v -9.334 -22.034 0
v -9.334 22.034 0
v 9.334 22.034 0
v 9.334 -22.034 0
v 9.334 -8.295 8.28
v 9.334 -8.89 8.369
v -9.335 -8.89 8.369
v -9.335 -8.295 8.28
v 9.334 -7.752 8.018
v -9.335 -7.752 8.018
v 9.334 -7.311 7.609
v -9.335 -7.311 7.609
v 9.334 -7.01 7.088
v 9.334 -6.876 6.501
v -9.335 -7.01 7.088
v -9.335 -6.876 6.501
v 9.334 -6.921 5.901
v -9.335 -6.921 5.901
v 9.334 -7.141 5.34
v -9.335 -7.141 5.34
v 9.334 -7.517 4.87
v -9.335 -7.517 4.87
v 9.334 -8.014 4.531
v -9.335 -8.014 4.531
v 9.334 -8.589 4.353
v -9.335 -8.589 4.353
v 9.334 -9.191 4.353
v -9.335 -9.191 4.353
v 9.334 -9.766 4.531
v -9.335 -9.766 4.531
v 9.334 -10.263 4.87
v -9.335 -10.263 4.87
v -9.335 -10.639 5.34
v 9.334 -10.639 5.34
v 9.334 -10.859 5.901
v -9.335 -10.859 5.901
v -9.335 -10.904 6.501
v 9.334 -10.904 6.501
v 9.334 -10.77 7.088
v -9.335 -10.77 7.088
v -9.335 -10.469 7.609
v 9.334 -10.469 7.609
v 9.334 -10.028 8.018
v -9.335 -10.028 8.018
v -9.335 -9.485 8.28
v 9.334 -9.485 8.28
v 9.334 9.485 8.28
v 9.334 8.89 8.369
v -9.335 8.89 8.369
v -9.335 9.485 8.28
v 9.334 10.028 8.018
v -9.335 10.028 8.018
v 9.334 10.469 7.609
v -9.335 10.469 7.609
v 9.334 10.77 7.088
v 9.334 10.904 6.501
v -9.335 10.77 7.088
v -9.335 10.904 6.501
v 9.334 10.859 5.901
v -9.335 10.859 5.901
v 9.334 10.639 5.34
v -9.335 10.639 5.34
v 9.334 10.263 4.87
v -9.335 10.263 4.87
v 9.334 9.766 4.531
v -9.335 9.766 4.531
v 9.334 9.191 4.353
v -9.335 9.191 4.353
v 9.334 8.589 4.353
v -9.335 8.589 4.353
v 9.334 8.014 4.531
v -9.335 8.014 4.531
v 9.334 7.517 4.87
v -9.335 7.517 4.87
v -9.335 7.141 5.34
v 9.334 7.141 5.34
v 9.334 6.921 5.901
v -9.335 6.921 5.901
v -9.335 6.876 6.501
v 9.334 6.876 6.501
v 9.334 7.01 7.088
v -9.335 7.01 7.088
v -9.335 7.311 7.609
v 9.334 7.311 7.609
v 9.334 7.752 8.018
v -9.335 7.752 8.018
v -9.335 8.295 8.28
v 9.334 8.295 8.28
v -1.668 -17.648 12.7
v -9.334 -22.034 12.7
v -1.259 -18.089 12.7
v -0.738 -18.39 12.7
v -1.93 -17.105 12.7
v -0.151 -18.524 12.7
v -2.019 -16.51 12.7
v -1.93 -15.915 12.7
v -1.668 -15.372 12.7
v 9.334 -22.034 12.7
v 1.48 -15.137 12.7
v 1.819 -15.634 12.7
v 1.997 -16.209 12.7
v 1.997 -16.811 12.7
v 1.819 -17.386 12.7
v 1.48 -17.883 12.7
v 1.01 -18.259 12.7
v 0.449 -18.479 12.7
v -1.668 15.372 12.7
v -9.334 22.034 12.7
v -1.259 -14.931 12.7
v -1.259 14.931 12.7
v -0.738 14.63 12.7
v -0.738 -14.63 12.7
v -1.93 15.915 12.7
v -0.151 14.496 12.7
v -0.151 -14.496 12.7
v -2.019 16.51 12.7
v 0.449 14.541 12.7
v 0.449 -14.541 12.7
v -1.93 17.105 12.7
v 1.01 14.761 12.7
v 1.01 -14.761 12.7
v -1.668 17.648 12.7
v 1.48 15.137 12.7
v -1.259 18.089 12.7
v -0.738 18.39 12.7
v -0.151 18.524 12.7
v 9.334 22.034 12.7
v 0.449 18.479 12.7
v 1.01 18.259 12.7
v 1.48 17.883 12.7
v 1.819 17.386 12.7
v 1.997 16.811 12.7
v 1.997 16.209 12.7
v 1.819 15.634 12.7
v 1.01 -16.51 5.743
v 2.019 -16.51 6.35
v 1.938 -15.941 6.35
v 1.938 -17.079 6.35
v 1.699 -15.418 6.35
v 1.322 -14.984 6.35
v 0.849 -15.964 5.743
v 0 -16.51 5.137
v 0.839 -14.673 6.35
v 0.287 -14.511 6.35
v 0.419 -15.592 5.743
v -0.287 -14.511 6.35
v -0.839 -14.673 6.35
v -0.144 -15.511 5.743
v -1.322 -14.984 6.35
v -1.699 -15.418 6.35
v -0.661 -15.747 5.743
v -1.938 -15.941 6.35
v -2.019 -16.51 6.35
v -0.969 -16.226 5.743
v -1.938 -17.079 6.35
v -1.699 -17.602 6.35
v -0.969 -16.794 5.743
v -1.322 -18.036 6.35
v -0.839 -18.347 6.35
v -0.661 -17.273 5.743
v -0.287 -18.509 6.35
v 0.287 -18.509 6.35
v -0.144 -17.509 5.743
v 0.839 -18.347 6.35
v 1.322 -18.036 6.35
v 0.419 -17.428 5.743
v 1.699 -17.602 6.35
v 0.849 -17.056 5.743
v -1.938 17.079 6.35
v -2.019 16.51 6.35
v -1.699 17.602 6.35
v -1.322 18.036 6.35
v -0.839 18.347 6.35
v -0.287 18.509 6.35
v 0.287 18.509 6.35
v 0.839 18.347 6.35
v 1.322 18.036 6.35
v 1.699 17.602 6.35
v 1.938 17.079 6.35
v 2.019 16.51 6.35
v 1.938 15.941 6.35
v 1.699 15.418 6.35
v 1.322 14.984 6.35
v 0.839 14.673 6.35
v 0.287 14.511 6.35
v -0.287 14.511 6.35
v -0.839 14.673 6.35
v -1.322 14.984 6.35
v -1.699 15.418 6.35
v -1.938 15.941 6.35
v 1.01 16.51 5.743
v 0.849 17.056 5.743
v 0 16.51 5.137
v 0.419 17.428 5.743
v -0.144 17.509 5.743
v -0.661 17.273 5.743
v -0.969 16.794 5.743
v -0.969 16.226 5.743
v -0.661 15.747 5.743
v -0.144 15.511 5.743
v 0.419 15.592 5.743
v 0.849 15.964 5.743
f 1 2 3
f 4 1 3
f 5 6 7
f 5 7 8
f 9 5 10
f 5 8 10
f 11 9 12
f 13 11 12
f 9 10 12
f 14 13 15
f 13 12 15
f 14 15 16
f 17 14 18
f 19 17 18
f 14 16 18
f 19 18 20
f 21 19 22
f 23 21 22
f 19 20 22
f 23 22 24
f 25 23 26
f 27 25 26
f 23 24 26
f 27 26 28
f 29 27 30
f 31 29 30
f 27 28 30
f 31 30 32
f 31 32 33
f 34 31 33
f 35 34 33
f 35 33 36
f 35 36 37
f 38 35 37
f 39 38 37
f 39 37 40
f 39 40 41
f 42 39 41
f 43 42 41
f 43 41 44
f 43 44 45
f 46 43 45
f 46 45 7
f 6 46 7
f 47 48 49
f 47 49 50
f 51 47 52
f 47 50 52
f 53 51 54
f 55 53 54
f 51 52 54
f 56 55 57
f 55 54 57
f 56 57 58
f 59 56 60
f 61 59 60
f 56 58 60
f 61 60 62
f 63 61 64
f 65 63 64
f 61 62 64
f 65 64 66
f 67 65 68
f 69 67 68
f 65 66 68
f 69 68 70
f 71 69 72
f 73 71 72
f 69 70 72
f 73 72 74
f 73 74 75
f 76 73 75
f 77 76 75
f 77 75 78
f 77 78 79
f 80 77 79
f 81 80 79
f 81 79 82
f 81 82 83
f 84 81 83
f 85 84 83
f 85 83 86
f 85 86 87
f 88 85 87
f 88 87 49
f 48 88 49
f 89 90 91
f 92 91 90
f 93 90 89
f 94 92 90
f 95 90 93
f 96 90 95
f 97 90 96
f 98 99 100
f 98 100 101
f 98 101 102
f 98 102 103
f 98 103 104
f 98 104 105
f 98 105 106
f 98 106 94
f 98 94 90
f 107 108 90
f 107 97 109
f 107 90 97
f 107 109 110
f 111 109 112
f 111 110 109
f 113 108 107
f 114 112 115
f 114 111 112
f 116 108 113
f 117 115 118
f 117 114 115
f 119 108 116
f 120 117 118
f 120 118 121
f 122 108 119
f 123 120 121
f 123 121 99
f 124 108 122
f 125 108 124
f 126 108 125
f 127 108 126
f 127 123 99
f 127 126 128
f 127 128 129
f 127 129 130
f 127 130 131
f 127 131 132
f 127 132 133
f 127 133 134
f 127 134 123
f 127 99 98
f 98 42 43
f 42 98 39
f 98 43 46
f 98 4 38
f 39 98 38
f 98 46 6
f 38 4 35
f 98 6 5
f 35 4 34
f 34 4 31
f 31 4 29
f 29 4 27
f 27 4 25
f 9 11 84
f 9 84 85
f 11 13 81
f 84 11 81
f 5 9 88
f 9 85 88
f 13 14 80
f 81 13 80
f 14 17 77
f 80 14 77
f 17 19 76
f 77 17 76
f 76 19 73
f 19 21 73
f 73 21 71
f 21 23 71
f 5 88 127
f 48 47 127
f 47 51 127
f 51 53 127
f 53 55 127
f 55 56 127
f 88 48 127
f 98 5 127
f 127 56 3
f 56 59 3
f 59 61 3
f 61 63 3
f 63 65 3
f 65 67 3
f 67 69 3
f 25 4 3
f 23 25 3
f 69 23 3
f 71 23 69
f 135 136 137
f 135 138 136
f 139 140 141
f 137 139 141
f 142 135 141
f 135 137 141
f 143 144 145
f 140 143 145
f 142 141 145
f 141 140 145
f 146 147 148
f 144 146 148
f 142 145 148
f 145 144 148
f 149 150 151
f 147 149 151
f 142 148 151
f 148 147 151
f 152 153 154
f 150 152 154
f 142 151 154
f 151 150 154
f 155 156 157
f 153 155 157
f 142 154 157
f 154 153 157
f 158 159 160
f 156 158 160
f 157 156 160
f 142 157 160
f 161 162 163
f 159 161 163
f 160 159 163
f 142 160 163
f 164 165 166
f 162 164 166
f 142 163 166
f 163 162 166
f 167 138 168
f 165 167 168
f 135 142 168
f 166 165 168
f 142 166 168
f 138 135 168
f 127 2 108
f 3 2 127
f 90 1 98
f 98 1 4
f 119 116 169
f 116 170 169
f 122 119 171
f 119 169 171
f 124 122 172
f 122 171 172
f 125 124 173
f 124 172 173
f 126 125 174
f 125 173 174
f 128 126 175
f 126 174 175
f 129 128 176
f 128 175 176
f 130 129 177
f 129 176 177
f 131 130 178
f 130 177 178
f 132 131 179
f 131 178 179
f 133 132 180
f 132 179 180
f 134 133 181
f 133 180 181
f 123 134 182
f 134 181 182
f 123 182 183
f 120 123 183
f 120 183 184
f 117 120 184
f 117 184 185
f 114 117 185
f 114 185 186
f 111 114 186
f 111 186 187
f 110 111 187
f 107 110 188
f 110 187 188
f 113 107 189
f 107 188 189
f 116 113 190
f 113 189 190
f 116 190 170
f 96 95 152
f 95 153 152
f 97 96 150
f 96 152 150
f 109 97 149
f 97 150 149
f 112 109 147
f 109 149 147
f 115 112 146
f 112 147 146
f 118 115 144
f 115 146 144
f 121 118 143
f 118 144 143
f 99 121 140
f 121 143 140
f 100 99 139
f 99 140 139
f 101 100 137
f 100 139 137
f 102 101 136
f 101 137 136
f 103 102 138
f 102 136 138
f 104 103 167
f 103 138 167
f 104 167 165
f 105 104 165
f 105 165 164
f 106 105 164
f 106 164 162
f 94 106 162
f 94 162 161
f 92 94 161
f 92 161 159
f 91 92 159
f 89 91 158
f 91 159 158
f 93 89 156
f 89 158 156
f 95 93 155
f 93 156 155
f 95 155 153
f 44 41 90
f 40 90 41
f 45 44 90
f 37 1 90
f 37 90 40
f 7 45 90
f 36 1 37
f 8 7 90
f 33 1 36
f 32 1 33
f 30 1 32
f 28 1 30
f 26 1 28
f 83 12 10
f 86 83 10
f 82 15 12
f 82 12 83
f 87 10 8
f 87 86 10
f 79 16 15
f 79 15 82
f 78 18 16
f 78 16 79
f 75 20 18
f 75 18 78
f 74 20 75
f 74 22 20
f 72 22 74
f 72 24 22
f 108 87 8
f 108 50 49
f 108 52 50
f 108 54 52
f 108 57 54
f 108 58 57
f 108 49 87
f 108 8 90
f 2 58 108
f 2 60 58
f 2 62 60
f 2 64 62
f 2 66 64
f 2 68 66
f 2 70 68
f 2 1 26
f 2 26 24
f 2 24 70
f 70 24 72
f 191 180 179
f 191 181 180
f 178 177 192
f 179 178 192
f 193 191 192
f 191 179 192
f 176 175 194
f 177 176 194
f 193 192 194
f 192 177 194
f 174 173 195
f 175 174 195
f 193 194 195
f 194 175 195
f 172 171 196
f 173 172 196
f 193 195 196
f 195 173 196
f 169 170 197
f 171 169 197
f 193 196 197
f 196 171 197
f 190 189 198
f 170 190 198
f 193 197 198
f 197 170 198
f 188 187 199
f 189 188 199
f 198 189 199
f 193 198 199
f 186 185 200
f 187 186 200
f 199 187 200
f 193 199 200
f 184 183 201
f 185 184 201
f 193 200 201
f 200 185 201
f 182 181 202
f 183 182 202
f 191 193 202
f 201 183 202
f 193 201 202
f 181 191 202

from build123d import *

# Parameters (mm, degrees)
SKETCH1_W                      = 18.669
SKETCH1_H                      = 44.069
BOSS_EXTRUDE1_DEPTH            = 12.7
TAP_DRILL_FOR_10_32_TAP1_D     = 4.0386
TAP_DRILL_FOR_10_32_TAP2_D     = 4.0386
TAP_DRILL_FOR_10_32_TAP2_DEPTH = 6.35
TAP_DRILL_FOR_10_32_TAP2_TIP   = 1.213317848


with BuildPart() as part:
    # Sketch1 → Boss-Extrude1 (new body)
    with BuildSketch(Plane.XY):
        Rectangle(SKETCH1_W, SKETCH1_H)
    extrude(amount=BOSS_EXTRUDE1_DEPTH)

    # Tap Drill for #10-32 Tap1 (through all)
    with Locations(Plane(origin=(9.3345, 0, 0), x_dir=(0, 0, -1), z_dir=(1, 0, 0))):
        with Locations((-6.35, 8.89), (-6.35, -8.89)):
            Hole(TAP_DRILL_FOR_10_32_TAP1_D / 2)

    # Tap Drill for #10-32 Tap2
    with Locations(Plane.XY.offset(12.7)):
        with Locations((0, 16.51), (0, -16.51)):
            Hole(TAP_DRILL_FOR_10_32_TAP2_D / 2, depth=TAP_DRILL_FOR_10_32_TAP2_DEPTH)
            with Locations((0, 0, -(TAP_DRILL_FOR_10_32_TAP2_DEPTH + TAP_DRILL_FOR_10_32_TAP2_TIP / 2))):  # 118° drill point
                Cone(0, TAP_DRILL_FOR_10_32_TAP2_D / 2, TAP_DRILL_FOR_10_32_TAP2_TIP, mode=Mode.SUBTRACT)


solid = part.part
